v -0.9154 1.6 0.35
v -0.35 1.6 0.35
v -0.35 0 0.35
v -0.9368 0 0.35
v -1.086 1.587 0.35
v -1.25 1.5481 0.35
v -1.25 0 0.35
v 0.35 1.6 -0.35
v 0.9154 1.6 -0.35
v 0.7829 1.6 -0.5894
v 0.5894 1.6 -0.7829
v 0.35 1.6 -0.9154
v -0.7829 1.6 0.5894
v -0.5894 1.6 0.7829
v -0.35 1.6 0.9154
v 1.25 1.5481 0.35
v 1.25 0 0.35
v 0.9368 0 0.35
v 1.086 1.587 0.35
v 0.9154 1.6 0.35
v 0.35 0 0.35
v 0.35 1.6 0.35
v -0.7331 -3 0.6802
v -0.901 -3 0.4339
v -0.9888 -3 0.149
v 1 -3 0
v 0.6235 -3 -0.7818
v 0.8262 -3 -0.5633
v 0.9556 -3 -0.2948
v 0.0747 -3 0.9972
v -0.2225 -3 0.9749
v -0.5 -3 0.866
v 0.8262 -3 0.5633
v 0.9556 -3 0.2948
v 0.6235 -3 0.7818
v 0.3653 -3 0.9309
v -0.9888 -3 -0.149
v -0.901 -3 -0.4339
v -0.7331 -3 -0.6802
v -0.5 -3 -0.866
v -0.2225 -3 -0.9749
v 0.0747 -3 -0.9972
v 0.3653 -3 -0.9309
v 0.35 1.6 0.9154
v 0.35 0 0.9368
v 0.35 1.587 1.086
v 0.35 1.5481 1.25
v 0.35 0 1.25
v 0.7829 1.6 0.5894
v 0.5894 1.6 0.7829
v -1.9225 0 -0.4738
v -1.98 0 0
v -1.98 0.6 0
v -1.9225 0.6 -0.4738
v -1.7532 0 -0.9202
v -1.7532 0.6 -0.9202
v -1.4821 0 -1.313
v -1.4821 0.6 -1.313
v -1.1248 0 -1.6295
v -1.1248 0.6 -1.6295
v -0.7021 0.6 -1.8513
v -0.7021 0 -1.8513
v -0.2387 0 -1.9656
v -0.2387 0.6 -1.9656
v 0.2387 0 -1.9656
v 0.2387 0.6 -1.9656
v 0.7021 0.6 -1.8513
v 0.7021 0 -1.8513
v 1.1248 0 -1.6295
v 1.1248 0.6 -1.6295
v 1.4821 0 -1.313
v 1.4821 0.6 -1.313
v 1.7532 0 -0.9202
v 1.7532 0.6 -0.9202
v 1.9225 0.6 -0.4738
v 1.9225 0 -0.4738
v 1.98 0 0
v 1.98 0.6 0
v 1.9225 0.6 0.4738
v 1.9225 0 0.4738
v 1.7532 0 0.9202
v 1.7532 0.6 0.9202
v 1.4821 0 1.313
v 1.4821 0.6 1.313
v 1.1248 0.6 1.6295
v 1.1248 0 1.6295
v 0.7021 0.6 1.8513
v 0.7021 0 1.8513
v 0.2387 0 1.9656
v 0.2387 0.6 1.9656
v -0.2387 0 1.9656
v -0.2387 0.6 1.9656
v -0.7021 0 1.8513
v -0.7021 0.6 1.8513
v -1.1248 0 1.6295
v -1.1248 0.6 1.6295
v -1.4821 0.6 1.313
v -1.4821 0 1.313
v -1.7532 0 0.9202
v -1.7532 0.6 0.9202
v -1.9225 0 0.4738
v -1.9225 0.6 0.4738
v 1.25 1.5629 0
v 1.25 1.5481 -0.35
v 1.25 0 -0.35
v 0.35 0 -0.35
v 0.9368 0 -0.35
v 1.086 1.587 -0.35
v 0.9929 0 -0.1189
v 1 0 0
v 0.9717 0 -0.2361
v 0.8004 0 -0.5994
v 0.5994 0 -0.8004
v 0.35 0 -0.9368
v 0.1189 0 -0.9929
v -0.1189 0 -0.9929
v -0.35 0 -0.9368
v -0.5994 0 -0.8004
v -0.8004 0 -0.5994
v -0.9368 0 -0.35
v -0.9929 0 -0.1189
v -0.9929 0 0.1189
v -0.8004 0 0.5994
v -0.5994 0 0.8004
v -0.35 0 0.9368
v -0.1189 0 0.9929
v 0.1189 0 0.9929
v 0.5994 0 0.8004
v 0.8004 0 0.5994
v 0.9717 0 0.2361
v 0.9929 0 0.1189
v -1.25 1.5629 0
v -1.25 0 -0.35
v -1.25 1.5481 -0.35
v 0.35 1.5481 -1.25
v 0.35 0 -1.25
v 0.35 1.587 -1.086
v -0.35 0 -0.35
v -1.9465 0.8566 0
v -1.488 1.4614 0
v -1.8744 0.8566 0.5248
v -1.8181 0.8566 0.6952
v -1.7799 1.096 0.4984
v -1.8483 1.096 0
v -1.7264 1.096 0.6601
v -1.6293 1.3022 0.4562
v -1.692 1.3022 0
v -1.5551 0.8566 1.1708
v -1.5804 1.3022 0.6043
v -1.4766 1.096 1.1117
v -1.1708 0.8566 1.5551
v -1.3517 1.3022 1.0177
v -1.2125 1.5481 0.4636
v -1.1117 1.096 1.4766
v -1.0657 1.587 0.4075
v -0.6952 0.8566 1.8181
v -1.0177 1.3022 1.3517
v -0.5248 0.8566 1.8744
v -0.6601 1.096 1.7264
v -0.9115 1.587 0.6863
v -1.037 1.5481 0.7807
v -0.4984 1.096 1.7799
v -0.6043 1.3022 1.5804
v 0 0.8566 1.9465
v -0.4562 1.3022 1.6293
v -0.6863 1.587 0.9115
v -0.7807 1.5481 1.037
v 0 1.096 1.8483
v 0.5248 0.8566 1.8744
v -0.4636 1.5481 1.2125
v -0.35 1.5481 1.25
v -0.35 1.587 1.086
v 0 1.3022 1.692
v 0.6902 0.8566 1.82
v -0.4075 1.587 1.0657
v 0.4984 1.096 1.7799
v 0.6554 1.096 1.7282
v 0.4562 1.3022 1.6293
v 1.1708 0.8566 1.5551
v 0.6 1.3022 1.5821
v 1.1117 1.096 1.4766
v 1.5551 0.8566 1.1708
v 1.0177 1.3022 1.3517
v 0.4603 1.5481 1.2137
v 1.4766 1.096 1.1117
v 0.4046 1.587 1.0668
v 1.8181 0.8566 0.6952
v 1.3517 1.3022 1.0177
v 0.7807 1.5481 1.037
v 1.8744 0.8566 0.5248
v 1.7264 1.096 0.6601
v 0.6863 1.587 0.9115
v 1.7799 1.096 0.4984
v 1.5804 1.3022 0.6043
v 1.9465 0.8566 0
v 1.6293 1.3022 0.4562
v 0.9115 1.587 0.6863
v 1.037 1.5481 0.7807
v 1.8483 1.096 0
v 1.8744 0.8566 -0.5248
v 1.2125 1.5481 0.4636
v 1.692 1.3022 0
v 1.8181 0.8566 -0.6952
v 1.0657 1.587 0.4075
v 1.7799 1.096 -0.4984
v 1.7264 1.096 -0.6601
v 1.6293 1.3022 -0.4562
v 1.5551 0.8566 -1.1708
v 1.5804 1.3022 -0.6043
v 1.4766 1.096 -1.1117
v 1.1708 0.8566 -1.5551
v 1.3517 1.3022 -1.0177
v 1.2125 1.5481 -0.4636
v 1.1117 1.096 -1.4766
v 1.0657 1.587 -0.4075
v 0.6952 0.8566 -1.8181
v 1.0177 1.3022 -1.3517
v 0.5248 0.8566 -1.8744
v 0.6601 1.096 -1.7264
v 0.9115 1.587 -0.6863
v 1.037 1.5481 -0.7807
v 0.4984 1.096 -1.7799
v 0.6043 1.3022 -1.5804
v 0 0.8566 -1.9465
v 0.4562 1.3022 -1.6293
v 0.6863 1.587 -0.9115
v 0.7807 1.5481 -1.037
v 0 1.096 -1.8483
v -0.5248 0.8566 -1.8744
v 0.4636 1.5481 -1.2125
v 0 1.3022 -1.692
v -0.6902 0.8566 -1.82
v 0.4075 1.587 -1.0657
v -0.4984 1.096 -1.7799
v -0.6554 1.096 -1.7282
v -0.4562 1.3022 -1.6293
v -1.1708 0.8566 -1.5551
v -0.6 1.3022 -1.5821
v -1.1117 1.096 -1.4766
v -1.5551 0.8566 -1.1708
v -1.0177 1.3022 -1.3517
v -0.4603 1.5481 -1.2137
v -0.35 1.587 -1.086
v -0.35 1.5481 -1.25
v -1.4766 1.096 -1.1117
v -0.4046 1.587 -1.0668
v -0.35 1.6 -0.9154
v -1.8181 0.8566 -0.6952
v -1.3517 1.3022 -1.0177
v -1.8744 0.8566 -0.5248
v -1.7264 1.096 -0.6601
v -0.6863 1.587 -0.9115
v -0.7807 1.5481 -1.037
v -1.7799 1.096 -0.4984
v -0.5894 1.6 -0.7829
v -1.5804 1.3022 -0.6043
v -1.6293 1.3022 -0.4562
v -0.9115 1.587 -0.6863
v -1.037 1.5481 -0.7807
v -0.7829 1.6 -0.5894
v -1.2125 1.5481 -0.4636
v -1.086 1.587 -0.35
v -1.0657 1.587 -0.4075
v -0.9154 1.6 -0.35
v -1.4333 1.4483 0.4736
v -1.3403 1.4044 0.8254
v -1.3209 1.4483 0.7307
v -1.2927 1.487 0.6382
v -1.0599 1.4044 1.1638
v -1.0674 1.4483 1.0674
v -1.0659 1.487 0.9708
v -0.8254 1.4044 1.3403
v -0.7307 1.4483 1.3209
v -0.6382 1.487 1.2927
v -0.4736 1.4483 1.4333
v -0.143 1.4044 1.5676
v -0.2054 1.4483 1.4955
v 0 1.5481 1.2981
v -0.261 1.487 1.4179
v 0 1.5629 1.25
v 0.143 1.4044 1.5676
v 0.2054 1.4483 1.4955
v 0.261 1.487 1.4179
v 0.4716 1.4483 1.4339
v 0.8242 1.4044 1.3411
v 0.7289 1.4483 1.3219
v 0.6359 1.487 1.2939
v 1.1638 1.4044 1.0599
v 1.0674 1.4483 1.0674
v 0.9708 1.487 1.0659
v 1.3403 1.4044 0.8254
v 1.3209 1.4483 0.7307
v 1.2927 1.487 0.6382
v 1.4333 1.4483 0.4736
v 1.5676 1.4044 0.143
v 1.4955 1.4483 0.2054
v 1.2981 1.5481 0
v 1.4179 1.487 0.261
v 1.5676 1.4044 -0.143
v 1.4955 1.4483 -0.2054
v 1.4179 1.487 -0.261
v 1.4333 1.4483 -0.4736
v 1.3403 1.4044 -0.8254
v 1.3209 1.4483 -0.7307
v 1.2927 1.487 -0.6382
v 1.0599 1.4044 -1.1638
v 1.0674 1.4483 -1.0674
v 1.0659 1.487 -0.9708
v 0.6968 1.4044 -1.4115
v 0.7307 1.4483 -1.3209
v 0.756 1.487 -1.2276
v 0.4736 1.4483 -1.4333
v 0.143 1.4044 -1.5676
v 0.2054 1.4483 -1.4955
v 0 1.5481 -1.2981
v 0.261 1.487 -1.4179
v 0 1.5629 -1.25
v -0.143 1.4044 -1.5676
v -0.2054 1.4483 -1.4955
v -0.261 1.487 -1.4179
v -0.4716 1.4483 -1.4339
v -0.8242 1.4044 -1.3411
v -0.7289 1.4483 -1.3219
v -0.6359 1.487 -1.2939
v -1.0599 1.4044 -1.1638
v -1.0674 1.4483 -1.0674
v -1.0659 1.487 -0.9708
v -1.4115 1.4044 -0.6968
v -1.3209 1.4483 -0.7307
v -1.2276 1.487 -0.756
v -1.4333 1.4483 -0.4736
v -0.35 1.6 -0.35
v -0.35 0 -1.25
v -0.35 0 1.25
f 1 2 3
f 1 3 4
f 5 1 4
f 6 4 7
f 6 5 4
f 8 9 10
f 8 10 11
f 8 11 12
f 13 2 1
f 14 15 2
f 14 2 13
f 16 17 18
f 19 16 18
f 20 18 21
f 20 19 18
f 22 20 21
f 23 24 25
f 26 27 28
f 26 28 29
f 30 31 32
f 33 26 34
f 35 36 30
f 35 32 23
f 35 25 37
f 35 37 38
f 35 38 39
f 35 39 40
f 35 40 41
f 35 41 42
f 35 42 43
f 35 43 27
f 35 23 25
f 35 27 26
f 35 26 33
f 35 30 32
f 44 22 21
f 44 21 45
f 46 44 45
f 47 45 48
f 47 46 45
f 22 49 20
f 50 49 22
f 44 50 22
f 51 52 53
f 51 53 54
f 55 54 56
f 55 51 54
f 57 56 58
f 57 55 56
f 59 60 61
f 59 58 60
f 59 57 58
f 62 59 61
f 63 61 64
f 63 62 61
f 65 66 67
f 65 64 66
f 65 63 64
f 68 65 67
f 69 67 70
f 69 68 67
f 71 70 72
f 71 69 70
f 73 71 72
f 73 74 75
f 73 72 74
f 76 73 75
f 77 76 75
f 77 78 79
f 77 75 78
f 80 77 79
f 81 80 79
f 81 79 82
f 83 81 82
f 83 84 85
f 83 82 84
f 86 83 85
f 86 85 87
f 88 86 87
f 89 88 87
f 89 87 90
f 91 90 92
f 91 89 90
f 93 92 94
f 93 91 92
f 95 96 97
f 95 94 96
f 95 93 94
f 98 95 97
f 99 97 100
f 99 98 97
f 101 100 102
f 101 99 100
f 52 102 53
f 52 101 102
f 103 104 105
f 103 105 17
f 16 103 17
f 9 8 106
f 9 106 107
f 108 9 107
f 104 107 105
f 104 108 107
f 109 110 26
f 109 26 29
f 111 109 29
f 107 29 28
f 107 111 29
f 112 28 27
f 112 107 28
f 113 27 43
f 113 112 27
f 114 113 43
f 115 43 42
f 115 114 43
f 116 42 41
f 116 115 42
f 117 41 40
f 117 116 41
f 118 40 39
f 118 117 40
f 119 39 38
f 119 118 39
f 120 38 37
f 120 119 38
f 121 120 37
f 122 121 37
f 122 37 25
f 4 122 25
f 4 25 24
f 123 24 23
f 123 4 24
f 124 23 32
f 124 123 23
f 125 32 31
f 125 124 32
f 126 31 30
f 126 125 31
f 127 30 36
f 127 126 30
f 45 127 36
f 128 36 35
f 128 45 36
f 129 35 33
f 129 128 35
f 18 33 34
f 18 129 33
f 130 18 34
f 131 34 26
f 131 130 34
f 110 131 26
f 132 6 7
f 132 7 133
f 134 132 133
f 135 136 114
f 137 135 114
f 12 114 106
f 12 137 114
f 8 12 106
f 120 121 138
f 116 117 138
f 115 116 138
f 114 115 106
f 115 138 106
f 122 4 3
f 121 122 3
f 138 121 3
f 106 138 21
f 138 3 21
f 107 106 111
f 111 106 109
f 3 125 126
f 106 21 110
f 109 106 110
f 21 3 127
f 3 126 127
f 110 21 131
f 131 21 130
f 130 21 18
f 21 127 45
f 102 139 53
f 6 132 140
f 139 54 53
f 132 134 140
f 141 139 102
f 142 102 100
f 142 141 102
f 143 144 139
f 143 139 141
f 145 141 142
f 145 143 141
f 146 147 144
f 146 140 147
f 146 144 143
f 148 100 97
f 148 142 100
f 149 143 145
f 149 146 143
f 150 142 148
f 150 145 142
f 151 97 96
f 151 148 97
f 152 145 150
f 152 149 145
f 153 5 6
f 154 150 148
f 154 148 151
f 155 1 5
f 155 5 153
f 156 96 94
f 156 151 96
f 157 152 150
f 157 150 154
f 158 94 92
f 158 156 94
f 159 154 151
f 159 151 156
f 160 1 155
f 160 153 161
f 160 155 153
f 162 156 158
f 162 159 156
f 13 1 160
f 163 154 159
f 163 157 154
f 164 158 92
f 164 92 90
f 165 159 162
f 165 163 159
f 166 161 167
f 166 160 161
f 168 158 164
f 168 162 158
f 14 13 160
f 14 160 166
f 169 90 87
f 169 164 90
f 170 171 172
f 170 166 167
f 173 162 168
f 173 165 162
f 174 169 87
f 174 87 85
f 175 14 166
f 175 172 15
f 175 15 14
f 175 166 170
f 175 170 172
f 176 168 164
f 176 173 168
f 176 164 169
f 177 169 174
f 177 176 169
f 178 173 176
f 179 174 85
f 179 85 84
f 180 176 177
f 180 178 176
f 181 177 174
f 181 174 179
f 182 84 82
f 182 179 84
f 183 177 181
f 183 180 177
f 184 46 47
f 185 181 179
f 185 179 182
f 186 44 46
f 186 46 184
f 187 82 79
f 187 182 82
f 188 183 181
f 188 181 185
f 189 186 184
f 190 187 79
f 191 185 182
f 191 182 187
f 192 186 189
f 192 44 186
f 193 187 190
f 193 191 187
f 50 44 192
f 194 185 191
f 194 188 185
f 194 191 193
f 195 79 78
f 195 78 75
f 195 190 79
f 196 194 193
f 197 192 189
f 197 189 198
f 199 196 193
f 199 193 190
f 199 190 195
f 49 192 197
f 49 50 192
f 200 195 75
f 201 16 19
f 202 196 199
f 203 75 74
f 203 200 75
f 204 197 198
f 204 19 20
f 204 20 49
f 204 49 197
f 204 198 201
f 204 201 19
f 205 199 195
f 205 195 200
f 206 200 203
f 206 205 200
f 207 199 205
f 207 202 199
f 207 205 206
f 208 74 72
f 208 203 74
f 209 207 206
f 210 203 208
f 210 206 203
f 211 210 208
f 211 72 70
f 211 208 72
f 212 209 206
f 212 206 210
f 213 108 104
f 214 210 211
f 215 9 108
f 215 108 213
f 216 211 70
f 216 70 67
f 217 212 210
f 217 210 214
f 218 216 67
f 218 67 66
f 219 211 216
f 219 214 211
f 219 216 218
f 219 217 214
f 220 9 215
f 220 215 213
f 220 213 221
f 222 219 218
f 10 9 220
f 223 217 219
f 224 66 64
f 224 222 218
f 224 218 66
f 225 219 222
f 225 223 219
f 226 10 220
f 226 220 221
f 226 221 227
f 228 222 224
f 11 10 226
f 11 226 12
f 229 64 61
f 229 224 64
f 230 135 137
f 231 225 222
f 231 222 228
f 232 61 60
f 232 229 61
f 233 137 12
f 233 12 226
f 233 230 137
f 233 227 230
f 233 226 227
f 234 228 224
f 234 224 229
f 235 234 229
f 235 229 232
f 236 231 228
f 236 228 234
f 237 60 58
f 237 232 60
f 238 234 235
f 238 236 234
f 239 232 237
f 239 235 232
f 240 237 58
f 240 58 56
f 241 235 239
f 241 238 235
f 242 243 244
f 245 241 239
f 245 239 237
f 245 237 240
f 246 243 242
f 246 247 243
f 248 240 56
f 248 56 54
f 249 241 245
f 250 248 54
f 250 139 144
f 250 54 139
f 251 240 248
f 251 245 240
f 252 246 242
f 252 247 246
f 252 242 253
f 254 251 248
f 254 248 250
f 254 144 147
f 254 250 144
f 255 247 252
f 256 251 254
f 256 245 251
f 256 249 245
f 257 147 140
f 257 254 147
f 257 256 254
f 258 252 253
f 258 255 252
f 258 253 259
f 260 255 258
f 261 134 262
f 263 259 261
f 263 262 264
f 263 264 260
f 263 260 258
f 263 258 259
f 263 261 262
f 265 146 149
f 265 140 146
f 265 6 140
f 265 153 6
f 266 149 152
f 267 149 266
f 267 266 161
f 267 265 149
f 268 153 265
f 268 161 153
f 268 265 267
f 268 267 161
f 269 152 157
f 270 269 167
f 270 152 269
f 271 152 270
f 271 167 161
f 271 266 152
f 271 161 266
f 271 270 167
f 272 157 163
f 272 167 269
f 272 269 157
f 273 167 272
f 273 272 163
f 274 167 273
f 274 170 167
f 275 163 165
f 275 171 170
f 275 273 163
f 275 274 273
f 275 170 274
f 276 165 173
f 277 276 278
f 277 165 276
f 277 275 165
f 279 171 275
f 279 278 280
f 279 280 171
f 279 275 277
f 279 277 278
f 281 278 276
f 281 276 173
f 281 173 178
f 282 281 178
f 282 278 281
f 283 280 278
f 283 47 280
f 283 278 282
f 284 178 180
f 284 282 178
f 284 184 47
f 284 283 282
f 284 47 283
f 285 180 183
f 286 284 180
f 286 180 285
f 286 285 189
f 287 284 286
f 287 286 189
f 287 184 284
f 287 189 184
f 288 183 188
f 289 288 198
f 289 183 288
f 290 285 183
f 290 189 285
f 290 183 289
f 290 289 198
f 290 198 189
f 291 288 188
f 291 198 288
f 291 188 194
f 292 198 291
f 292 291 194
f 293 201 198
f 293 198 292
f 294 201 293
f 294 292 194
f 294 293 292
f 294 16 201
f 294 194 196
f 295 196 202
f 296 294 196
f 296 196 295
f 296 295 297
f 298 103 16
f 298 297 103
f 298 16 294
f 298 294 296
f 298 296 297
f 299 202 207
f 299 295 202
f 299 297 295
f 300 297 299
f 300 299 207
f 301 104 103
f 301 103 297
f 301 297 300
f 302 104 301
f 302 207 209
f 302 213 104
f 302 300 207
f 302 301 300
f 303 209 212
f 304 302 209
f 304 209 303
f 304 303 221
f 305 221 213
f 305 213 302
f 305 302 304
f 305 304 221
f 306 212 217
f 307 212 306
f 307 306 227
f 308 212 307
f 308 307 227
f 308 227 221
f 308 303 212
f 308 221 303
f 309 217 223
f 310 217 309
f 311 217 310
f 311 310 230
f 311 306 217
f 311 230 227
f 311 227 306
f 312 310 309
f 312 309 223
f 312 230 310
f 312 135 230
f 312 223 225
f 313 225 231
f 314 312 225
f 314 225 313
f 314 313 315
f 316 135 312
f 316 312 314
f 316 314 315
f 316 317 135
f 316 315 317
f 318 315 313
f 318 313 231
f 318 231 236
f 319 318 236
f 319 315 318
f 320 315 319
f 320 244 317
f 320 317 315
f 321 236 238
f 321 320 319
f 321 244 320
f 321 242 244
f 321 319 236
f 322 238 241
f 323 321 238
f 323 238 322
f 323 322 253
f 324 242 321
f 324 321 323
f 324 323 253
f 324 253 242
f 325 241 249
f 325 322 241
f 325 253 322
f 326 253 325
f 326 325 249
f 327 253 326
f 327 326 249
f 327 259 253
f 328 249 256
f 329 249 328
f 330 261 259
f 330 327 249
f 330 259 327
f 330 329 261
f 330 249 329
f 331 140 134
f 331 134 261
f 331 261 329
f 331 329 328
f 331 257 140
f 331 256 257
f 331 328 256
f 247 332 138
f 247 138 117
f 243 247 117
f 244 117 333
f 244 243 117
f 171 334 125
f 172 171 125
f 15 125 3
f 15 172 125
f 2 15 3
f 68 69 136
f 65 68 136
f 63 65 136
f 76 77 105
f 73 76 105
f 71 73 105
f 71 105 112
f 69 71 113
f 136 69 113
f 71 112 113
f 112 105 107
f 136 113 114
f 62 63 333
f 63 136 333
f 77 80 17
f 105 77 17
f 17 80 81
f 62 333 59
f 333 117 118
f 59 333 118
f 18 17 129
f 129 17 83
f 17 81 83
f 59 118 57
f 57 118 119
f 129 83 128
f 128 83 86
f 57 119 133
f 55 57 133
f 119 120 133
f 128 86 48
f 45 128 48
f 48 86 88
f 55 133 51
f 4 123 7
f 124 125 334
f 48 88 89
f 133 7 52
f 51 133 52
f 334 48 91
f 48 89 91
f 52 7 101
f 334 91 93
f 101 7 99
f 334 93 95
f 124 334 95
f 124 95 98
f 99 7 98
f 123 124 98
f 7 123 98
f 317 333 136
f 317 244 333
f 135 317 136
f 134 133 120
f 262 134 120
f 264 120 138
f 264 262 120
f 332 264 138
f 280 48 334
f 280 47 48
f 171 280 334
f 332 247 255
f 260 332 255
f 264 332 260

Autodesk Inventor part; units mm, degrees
ref_plane "YZ Plane" through (0, 0, 0) normal (1, 0, 0) x (0, 1, 0)
ref_plane "XZ Plane" through (0, 0, 0) normal (0, 1, 0) x (-1, 0, 0)
ref_plane "XY Plane" through (0, 0, 0) normal (0, 0, 1) x (1, 0, 0)
sketch "Sketch1" plane through (0, 0, 0) normal (0, 1, 0) x (-1, 0, 0)
  circle A0 centre (0, 0) radius 1.98
  dimension "d0" = 3.96
extrude "Extrusion1" add sketch "Sketch1" along normal blind 1.6
sketch "Sketch2" plane through (0, 1.6, 0) normal (0, 1, 0) x (1, 0, 0)
  line L0 (-0.35, -0.35) -> (-1.25, -0.35)
  line L1 (-1.25, -0.35) -> (-1.25, 0.35)
  line L2 (-1.25, 0.35) -> (-0.35, 0.35)
  line L3 (-0.35, 0.35) -> (-0.35, 1.25)
  line L4 (-0.35, 1.25) -> (0.35, 1.25)
  line L5 (0.35, 1.25) -> (0.35, 0.35)
  line L6 (0.35, 0.35) -> (1.25, 0.35)
  line L7 (1.25, 0.35) -> (1.25, -0.35)
  line L8 (1.25, -0.35) -> (0.35, -0.35)
  line L9 (0.35, -1.25) -> (-0.35, -1.25)
  line L10 (-0.35, -1.25) -> (-0.35, -0.35)
  line L11 (0.35, -0.35) -> (0.35, -1.25)
  point P0 (0, 0)
  point P1 (0, -1.25)
  point P2 (0, 1.25)
  point P3 (-1.25, 0)
  point P4 (1.25, 0)
  dimension "d3" = 2.5
  dimension "d4" = 2.5
  dimension "d5" = 1.25
  dimension "d6" = 1.25
  dimension "d7" = 0.7
  dimension "d8" = 0.7
extrude "Extrusion2" cut sketch "Sketch2" against normal blind 2
fillet "Fillet1" radius 1 1 edges at (1.98, 1.6, 0)
sketch "Sketch3" plane through (0, 0, 0) normal (0, -1, 0) x (1, 0, 0)
  circle A0 centre (0, 0) radius 1
  dimension "d12" = 2
extrude "Extrusion3" add sketch "Sketch3" along normal blind 3
thread "Thread1" size "M2x0.4" class "6g" standard "ANSI Metric M Profile" full length
equation "\"d4\" = d3"
equation "\"d5\" = 0.5 * d4"
equation "\"d6\" = d5"
equation "\"d8\" = d7"
properties part number "M4_8mm" material "Stainless Steel"
